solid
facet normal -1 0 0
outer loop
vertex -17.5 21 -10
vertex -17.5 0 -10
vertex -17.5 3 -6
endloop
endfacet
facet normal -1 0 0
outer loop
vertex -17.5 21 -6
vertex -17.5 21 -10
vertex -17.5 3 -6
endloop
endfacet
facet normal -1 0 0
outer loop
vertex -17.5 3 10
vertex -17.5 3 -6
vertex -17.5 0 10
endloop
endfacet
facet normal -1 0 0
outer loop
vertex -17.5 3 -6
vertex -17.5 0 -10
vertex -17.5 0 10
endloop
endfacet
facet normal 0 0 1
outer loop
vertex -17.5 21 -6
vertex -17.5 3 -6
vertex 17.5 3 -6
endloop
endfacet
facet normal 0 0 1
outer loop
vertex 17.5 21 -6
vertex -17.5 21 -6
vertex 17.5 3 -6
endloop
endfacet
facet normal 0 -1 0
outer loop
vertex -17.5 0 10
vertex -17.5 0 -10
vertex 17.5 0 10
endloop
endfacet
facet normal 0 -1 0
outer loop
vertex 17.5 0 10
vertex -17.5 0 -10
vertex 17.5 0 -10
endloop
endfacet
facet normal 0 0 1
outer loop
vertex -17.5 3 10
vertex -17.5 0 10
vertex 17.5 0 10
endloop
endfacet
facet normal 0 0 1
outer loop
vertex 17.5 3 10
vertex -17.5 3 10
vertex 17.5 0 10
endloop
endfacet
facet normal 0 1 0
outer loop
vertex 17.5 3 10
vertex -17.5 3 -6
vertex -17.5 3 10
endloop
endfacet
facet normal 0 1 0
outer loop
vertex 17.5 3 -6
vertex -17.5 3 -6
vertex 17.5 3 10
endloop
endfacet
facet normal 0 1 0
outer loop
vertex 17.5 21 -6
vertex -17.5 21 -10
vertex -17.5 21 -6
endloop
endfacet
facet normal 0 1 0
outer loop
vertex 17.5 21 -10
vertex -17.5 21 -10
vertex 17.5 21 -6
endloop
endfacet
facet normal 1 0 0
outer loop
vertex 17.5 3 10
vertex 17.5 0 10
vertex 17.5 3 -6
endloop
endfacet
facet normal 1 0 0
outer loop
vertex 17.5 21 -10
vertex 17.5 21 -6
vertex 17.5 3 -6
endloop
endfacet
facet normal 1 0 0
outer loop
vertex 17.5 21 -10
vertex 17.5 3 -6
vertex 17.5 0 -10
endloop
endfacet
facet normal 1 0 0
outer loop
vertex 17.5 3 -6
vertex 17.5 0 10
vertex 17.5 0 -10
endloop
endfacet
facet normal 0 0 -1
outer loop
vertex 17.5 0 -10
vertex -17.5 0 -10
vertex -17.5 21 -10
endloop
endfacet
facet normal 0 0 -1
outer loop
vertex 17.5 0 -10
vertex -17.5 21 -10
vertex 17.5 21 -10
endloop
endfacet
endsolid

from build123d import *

# Parameters (mm, degrees)
SKETCH1_W           = 35
SKETCH1_H           = 20
BOSS_EXTRUDE1_DEPTH = 3
SKETCH1_3_W         = 35
SKETCH1_3_H         = 4
BOSS_EXTRUDE2_DEPTH = 21


with BuildPart() as part:
    # Sketch1 → Boss-Extrude1 (new body)
    with BuildSketch(Plane(origin=(0, 0, 0), x_dir=(1, 0, 0), z_dir=(0, 1, 0))):
        Rectangle(SKETCH1_W, SKETCH1_H)
    extrude(amount=BOSS_EXTRUDE1_DEPTH)

    # Sketch1<3> → Boss-Extrude2 (add)
    with BuildSketch(Plane(origin=(0, 0, 0), x_dir=(1, 0, 0), z_dir=(0, 1, 0))):
        with Locations((0, 8)):
            Rectangle(SKETCH1_3_W, SKETCH1_3_H)
    extrude(amount=BOSS_EXTRUDE2_DEPTH)


solid = part.part
